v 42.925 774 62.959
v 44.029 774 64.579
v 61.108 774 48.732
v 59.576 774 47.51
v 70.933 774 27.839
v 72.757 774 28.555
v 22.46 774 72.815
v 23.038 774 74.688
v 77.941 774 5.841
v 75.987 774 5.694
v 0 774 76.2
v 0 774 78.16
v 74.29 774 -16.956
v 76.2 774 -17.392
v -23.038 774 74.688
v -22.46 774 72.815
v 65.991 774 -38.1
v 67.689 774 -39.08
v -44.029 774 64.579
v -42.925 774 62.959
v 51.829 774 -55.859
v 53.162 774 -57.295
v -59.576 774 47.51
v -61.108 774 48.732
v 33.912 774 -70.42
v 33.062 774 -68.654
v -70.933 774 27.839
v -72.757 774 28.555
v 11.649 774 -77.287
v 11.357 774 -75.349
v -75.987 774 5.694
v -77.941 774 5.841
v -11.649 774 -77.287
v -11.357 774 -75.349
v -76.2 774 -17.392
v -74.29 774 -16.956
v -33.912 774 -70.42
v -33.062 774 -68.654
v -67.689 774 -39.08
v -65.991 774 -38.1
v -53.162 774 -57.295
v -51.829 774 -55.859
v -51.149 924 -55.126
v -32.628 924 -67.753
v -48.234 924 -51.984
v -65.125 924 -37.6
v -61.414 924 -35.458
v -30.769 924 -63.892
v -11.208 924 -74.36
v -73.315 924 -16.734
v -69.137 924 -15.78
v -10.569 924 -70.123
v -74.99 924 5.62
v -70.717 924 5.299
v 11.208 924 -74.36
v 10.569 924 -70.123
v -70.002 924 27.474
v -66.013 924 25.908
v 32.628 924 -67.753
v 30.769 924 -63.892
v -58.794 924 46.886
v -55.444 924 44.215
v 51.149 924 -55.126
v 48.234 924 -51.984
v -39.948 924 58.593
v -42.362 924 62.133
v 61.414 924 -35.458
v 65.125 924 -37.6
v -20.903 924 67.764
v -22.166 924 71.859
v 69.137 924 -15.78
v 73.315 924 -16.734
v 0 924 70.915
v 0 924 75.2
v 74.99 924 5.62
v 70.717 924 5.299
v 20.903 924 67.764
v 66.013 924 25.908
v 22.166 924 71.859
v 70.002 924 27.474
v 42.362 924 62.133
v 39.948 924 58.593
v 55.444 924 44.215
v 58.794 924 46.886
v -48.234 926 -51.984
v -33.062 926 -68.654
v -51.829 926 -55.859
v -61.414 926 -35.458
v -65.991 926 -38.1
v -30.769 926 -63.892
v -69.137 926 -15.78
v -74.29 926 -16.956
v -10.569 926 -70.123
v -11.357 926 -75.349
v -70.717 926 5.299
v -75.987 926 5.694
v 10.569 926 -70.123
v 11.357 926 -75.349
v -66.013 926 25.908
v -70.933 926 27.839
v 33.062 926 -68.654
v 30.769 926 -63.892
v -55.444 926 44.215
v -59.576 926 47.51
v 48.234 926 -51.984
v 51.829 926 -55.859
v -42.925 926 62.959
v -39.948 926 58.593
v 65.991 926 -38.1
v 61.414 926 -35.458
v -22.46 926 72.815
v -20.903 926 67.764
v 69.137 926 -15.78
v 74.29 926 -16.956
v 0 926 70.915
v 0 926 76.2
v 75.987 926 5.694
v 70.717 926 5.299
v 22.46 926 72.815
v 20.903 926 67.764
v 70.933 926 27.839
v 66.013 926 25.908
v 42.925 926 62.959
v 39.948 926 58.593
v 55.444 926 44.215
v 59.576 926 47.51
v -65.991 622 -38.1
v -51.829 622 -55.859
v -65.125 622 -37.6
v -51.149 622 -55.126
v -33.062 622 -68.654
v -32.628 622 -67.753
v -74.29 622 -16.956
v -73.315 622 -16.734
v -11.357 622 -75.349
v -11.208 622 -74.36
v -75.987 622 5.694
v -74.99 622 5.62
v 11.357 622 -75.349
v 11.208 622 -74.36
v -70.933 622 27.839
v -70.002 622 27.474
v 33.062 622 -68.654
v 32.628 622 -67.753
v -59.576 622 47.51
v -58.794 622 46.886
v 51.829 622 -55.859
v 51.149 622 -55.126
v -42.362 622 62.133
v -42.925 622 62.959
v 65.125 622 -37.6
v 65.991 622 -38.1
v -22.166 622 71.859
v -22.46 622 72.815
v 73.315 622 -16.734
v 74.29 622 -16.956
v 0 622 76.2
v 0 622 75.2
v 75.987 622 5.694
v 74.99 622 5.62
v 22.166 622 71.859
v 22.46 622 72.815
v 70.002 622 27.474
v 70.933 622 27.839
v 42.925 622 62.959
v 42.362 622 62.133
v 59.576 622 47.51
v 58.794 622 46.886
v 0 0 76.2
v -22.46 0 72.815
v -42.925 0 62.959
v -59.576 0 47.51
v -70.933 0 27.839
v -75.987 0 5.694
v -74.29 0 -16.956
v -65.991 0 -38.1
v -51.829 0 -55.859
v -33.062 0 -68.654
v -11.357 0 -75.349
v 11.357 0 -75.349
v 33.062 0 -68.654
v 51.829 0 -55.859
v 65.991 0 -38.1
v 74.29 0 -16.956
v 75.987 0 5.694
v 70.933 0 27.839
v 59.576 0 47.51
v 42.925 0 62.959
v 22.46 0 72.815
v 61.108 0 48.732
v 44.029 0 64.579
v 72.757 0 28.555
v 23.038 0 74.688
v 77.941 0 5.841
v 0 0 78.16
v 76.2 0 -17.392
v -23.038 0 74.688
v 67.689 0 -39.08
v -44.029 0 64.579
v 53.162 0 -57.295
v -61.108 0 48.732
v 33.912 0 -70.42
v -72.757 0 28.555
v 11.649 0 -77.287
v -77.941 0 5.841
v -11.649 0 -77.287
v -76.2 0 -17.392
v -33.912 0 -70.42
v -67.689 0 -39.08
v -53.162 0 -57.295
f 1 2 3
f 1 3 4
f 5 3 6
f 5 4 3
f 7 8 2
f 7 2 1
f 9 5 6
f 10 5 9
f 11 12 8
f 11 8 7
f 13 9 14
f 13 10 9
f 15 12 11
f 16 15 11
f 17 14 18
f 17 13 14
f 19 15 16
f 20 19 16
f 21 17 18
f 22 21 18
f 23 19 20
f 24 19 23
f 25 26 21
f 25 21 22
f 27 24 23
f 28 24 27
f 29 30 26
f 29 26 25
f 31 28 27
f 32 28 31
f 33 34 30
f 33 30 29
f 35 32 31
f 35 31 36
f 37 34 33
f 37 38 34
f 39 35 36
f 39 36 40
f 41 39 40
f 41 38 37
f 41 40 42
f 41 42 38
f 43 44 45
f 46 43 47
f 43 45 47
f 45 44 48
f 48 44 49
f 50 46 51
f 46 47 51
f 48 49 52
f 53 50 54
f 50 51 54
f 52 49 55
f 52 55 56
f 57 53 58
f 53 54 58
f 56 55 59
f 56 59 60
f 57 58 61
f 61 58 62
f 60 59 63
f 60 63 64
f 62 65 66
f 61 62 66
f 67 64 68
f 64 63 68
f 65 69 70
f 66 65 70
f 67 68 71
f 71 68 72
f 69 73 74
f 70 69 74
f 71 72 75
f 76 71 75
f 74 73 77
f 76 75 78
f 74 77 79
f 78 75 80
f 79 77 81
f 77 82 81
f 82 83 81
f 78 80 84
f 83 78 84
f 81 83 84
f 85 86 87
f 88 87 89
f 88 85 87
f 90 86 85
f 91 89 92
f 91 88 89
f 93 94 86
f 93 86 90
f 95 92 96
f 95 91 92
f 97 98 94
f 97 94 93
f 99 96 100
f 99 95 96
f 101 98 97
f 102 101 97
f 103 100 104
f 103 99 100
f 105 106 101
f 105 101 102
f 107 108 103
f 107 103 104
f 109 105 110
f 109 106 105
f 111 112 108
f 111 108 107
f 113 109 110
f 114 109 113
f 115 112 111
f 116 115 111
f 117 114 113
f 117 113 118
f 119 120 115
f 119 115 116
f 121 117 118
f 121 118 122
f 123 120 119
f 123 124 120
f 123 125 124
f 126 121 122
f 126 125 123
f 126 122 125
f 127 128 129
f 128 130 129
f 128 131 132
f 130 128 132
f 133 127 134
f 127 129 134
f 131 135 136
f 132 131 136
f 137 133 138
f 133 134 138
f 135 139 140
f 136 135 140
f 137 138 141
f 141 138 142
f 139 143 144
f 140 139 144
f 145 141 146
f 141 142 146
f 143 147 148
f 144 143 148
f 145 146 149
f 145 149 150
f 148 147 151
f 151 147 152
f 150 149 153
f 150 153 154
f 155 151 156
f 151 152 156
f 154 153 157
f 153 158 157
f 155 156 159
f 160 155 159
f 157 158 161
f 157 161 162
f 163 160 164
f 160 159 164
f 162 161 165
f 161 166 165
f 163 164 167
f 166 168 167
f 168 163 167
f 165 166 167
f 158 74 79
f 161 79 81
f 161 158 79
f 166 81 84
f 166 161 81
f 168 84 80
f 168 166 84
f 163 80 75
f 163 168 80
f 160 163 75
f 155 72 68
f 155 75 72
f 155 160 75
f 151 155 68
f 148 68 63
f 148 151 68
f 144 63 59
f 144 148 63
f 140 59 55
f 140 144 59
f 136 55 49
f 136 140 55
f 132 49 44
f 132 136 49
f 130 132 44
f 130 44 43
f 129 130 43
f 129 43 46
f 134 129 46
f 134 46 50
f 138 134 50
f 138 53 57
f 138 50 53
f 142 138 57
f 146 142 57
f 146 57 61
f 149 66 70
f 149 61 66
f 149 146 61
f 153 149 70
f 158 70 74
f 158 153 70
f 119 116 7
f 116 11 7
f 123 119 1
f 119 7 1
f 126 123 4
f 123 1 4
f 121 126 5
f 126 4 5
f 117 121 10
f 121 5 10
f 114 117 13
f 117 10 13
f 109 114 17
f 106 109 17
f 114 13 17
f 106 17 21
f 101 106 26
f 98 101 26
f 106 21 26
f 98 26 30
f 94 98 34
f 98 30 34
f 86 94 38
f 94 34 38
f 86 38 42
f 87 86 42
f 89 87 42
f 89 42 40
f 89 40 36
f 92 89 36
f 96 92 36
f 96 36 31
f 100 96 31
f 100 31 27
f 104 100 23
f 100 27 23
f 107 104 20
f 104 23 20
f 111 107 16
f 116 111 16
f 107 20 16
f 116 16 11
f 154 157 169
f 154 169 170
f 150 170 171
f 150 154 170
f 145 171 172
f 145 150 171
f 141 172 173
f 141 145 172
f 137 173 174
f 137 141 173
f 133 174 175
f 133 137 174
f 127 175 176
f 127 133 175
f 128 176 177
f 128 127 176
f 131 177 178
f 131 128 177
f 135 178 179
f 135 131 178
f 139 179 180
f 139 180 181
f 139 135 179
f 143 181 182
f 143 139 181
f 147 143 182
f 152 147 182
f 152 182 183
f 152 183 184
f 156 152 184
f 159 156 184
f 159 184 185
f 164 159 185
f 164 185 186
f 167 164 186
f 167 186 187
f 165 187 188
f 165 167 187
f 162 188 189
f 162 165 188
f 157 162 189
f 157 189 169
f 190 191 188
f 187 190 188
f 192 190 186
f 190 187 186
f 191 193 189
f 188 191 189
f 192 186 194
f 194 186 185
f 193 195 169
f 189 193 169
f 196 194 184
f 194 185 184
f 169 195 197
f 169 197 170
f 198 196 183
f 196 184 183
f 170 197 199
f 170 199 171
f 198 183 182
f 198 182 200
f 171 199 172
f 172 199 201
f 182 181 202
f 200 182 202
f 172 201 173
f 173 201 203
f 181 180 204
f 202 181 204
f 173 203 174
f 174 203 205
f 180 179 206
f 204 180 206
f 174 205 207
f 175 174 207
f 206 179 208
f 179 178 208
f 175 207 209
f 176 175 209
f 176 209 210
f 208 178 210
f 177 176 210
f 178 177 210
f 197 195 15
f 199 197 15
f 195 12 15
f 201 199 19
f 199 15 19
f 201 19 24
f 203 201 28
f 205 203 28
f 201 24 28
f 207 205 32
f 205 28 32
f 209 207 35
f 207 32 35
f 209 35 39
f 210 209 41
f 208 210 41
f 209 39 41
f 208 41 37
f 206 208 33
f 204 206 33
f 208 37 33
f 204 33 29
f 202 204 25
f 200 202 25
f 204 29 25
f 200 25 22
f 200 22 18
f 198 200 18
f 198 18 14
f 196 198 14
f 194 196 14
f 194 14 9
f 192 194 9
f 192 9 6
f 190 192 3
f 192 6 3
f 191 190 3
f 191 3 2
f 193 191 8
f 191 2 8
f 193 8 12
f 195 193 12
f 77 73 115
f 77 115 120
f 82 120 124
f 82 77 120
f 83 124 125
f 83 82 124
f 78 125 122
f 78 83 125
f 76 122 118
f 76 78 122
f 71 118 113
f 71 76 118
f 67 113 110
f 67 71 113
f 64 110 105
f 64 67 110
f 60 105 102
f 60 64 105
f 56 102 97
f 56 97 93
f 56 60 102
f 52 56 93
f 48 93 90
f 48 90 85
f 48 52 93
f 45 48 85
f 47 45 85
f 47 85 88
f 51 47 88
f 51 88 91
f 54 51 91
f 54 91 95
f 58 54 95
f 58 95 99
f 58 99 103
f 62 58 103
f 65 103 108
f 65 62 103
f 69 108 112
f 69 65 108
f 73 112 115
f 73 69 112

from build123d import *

# Parameters (mm, degrees)
SKETCH1_W                = 1.96
SKETCH1_H                = 774
BOSS_EXTRUDE1_DEPTH      = 152
BOSS_EXTRUDE1_DEPTH_BACK = 152
SKETCH3_R                = 76.2
SKETCH3_R_2              = 75.2
BOSS_EXTRUDE2_START      = -2
SKETCH4_R                = 76.2
SKETCH4_R_2              = 70.915017824
BOSS_EXTRUDE2_DEPTH      = 2


with BuildPart() as part:
    # Sketch1 → Revolve1 (revolve)
    with BuildSketch(Plane.XY, mode=Mode.PRIVATE) as revolve1_sk:
        with Locations((77.18, 387)):
            Rectangle(SKETCH1_W, SKETCH1_H)
    revolve(revolve1_sk.sketch.rotate(Axis((0, 204.615384615, 0), (0, -1, 0)), 90), axis=Axis((0, 204.615384615, 0), (0, -1, 0)))

    # Sketch3 → Boss-Extrude1 (add, two sides: drawn at the far end of the back side and taken through both)
    with BuildSketch(Plane(origin=(0, 774, 0), x_dir=(1, 0, 0), z_dir=(0, 1, 0)).offset(-BOSS_EXTRUDE1_DEPTH_BACK)):
        with Locations(Location((0, 0, 0), (0, 0, 270))):
            Circle(SKETCH3_R)
        with Locations(Location((0, 0, 0), (0, 0, 270))):
            Circle(SKETCH3_R_2, mode=Mode.SUBTRACT)
    extrude(amount=BOSS_EXTRUDE1_DEPTH + BOSS_EXTRUDE1_DEPTH_BACK)

    # Sketch4 → Boss-Extrude2 (add)
    with BuildSketch(Plane(origin=(0, 926, 0), x_dir=(1, 0, 0), z_dir=(0, 1, 0)).offset(BOSS_EXTRUDE2_START)):
        with Locations(Location((0, 0, 0), (0, 0, 270))):
            Circle(SKETCH4_R)
        with Locations(Location((0, 0, 0), (0, 0, 270))):
            Circle(SKETCH4_R_2, mode=Mode.SUBTRACT)
    extrude(amount=BOSS_EXTRUDE2_DEPTH)


solid = part.part
